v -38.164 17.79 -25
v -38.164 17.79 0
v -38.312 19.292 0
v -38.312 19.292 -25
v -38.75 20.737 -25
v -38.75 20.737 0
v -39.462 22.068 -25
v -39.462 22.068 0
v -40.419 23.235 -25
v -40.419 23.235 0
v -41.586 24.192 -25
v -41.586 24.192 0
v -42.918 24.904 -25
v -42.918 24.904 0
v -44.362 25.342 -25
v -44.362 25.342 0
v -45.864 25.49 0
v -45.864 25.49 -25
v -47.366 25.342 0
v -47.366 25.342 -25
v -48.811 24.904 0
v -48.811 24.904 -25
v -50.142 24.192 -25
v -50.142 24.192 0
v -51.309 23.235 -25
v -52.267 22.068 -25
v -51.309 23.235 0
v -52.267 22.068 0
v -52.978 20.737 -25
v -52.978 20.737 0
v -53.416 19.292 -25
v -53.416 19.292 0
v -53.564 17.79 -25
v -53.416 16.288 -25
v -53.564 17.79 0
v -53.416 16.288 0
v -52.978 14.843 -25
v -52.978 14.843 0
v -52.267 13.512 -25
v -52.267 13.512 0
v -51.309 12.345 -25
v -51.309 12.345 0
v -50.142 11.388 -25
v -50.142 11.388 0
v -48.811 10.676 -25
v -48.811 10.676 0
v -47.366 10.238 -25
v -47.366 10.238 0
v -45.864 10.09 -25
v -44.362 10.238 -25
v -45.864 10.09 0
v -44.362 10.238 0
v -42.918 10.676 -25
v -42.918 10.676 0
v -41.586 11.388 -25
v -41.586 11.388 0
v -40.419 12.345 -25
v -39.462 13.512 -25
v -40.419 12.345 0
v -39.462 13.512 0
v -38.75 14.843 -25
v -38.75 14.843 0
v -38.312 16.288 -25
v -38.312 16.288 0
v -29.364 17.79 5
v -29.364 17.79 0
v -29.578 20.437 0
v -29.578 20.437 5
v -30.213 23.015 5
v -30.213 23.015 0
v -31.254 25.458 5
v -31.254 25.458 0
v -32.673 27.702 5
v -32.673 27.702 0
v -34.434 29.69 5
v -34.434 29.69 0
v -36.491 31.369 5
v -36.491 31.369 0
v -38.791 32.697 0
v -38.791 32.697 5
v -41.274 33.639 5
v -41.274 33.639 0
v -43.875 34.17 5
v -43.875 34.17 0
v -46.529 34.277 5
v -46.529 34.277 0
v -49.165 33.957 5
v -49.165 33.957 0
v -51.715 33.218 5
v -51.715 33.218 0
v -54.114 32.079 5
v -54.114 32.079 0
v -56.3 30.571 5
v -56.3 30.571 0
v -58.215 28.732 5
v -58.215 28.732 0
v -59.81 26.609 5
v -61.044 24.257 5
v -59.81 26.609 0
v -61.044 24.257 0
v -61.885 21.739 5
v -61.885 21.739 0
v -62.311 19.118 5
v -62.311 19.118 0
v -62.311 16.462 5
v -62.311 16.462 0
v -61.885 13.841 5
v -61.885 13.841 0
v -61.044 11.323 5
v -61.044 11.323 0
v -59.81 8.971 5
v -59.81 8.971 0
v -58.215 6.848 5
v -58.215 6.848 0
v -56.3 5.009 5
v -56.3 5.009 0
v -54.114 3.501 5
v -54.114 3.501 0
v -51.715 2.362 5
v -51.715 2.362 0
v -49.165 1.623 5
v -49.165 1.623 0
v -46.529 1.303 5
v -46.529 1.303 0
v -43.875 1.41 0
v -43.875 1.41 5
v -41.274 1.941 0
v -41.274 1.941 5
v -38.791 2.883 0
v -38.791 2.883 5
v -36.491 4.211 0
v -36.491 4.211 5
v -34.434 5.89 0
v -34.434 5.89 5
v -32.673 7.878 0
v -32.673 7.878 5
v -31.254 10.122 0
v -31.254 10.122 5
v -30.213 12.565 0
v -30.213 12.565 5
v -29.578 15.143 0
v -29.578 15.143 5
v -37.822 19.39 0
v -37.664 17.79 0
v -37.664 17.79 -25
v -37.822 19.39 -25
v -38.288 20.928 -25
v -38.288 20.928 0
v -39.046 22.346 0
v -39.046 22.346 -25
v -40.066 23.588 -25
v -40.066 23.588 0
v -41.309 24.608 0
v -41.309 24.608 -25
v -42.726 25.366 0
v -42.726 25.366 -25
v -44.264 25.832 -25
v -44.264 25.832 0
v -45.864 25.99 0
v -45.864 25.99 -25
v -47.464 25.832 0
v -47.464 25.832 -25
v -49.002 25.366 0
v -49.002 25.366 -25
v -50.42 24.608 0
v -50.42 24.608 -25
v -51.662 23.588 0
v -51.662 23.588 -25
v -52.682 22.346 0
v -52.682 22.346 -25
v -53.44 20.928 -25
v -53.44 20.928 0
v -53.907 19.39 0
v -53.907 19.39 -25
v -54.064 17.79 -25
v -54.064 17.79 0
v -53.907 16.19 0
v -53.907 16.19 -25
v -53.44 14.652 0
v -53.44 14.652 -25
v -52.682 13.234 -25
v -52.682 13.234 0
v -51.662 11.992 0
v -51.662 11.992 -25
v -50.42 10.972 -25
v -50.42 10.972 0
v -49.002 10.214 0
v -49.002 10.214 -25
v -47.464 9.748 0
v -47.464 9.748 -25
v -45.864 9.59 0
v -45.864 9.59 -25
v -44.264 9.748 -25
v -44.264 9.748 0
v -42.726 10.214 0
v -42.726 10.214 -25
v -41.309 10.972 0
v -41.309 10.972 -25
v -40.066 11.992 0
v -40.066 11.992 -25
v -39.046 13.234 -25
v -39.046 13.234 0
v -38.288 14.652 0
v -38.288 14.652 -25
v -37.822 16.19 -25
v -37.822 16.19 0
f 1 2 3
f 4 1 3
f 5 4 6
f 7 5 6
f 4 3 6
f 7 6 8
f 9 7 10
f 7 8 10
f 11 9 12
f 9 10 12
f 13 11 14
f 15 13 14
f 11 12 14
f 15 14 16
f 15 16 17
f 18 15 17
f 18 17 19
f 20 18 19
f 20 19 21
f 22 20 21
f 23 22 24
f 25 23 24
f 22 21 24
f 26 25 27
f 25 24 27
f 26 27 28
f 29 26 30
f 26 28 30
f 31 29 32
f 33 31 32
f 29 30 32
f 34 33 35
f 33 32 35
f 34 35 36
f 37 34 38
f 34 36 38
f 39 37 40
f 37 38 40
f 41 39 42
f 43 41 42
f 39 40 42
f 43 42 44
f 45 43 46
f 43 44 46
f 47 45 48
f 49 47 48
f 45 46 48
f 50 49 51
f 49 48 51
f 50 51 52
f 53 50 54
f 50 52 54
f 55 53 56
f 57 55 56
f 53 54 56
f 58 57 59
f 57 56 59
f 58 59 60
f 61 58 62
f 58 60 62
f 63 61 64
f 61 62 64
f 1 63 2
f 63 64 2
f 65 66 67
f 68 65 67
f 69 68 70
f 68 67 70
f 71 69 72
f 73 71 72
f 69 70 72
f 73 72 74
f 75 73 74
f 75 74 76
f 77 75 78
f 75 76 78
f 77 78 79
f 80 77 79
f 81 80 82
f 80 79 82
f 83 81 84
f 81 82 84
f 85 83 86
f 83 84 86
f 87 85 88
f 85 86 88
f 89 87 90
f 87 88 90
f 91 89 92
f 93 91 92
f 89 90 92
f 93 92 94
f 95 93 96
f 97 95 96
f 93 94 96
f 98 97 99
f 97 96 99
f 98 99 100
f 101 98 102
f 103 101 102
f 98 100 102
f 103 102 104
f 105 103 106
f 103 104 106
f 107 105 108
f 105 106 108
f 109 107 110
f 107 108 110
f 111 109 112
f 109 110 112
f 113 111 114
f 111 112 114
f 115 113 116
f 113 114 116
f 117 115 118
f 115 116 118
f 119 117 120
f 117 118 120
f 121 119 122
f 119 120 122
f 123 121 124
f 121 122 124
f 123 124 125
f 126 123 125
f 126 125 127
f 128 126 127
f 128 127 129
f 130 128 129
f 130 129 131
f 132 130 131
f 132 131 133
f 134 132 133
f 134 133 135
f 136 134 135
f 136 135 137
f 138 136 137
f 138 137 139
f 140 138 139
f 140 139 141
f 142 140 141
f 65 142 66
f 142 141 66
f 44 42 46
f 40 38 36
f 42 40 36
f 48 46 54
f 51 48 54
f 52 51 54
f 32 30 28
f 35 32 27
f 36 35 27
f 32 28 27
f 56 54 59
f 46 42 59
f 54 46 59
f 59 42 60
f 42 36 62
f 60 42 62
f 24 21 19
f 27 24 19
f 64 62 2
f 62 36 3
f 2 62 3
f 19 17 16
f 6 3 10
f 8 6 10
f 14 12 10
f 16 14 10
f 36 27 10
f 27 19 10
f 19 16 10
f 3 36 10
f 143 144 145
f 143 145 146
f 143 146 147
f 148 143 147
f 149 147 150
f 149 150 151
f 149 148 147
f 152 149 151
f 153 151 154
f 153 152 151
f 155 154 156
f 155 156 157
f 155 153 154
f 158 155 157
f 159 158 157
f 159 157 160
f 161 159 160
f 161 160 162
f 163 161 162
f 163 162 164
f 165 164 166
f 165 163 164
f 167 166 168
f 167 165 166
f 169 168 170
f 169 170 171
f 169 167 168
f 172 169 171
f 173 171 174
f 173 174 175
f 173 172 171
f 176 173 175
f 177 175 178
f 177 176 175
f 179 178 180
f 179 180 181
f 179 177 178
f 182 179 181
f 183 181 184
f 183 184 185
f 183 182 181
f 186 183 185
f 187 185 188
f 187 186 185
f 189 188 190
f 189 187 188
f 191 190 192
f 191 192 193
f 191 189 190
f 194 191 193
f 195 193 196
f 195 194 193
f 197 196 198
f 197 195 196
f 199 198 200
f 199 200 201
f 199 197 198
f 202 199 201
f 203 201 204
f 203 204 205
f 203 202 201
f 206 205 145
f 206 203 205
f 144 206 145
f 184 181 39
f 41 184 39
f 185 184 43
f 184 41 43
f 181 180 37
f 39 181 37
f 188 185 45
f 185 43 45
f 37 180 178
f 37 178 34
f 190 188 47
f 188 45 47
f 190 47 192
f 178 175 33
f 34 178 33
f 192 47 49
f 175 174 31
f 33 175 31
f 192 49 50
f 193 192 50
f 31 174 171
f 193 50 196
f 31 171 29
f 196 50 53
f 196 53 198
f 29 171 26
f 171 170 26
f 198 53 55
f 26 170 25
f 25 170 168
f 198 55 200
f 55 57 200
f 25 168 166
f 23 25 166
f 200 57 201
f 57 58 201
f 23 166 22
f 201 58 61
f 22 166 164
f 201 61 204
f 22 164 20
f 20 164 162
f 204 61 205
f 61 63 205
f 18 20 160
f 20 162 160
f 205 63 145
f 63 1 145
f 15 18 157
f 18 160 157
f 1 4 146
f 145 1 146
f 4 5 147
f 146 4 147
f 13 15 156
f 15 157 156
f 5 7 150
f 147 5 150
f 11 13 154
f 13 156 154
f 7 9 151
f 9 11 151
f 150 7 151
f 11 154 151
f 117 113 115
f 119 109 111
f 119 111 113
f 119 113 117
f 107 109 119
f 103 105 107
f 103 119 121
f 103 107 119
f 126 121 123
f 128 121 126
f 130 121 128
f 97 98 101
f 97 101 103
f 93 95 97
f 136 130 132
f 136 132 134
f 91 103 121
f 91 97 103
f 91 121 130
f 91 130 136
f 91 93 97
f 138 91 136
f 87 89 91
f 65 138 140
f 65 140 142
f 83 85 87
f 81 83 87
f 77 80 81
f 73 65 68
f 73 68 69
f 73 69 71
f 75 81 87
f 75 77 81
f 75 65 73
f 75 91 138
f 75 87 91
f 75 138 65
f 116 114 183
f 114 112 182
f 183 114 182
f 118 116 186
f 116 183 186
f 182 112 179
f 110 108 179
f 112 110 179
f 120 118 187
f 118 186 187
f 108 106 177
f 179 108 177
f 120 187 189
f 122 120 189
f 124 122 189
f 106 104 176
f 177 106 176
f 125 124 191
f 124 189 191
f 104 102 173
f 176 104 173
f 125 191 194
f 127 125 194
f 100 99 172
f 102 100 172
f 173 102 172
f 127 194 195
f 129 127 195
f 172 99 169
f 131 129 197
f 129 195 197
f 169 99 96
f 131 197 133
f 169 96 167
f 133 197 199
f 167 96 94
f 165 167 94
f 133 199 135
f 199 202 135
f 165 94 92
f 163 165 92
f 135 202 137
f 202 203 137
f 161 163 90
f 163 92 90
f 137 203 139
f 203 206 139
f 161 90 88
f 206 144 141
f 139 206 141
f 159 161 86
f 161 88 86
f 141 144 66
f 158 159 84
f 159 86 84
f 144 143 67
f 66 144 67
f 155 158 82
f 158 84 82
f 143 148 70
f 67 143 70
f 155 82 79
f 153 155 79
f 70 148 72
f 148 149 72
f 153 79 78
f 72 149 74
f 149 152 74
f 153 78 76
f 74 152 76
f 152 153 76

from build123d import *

# Parameters (mm, degrees)
F2_R     = 16.5
F3_DEPTH = 5
F4_R     = 8.2
F4_R_2   = 7.7
F5_DEPTH = 25


# Not quite as in the source:
# - the program builds the solid bodies; features that only make, move or delete a surface that nothing else refers to are left out


with BuildPart() as f3:
    # F2 (on Top) → F3 (new body)
    with BuildSketch(Plane.XY):
        with Locations((-45.8642121462, 17.7900076957)):
            Circle(F2_R)
    extrude(amount=F3_DEPTH)

    # F4 (on Top) → F5 (join)
    with BuildSketch(Plane.XY):
        with Locations((-45.8642121462, 17.7900076957)):
            Circle(F4_R)
        with Locations((-45.8642121462, 17.7900076957)):
            Circle(F4_R_2, mode=Mode.SUBTRACT)
    extrude(amount=-F5_DEPTH)


solid = f3.part
